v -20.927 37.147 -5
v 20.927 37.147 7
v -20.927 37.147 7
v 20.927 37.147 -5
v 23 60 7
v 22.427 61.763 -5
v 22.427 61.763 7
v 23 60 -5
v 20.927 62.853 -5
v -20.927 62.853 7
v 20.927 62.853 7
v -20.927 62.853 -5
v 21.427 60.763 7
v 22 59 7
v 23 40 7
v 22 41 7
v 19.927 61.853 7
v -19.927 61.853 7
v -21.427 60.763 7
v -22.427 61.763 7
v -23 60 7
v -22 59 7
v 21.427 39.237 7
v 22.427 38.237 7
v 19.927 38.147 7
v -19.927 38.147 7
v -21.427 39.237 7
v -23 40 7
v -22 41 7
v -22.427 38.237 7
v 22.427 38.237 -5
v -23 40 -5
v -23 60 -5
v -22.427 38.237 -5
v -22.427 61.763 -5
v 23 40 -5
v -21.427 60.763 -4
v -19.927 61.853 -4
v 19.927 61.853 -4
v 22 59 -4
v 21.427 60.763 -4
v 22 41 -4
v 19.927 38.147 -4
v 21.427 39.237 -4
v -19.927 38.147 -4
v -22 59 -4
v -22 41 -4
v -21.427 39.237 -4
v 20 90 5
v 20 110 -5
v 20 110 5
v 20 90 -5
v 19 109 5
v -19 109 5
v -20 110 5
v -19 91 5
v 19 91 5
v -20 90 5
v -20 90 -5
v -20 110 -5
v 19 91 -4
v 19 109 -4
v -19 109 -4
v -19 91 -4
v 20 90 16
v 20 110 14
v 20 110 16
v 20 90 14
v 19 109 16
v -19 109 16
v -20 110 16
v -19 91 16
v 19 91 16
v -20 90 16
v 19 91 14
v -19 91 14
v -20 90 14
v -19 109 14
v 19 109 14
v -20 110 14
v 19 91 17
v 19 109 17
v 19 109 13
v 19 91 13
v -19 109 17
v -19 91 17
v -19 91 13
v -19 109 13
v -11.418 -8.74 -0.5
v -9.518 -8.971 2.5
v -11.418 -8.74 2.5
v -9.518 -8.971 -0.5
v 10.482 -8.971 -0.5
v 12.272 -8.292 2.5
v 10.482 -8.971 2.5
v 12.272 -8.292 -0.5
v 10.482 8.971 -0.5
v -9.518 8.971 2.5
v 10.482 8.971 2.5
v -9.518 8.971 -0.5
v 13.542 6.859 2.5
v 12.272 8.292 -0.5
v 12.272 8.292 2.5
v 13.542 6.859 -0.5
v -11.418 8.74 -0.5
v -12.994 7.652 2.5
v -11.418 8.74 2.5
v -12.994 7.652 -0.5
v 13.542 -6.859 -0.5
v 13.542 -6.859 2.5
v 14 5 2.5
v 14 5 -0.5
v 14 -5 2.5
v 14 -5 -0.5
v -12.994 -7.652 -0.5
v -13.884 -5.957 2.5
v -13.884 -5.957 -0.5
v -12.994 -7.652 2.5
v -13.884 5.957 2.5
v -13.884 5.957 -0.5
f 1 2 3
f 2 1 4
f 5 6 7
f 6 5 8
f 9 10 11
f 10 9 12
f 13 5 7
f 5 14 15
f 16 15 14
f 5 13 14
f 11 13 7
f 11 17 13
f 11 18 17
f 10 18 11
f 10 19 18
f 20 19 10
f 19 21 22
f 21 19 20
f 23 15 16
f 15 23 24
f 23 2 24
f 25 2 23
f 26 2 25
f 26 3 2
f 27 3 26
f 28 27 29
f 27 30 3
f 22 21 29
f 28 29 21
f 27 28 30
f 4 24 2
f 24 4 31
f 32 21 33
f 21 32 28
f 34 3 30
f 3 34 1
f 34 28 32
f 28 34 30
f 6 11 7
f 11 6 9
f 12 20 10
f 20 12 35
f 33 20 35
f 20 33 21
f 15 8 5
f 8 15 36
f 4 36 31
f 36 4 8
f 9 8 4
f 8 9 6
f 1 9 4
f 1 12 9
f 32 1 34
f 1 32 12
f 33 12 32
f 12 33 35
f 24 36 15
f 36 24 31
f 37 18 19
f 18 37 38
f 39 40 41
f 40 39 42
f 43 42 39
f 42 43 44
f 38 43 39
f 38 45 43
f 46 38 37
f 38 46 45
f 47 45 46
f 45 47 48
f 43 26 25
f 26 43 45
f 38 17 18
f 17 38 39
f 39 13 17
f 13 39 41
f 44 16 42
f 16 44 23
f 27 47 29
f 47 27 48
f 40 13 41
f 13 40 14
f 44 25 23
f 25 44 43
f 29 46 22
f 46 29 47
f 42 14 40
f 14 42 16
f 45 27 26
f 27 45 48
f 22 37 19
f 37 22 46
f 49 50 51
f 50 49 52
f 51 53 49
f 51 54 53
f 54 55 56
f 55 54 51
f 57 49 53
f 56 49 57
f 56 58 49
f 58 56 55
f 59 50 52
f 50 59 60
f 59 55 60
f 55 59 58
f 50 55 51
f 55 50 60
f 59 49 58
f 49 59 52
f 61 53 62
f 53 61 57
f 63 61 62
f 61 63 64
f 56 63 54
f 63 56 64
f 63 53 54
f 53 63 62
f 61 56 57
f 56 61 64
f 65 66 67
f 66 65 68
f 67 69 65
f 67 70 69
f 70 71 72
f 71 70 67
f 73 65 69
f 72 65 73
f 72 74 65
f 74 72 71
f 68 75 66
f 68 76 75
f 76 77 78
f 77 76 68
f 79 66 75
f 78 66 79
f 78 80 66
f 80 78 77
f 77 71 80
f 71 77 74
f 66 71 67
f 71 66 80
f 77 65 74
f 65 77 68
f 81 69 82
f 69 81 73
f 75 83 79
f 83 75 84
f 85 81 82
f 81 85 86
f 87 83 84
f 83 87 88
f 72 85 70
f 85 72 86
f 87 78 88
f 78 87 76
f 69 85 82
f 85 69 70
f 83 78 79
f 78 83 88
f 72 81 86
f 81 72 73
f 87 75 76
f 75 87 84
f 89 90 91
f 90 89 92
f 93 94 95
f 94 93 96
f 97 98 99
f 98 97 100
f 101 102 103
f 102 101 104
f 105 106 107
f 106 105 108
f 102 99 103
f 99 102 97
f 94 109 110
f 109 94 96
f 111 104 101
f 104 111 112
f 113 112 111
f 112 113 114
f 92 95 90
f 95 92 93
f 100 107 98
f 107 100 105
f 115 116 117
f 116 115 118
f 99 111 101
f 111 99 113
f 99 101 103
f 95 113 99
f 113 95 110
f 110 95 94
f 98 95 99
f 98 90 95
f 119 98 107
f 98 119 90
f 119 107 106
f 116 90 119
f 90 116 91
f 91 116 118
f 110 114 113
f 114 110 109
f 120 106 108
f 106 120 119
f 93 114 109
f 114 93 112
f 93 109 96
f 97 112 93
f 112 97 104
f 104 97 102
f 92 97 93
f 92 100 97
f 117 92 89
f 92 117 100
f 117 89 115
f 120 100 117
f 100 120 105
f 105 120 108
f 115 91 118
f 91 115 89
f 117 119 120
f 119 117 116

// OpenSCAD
// Other ways to build parts
/*

Sage Ridge Robotics OpenSCAD file.
Christopher von Nagy, July 2014.

Example 07 Constructing objects. 

*/


// OpenSCAD has a few tricks for constructing objects
// that inolve the clever combination of geometric
// primitives, cubes, spheres, etc.

// The minkowski() command is one such tool. We are 
// going to use it to create a small box with rounded corners.

// First the basic shape is generated. You can change the size
// of the cylinders to alter the rounding of the corner.

translate([0,0,0])
minkowski()
{
   cube([20,10,1], center=true);
   cylinder(r=4,h=2);
};

// Great. Let's build the box by defining the outer box
// as a minkowski() object then subtracting a slightly
// smaller box to leave 1mm walls.

translate([0,50,0])
difference(){
   minkowski()
   {
      cube([40,20,10], center=true);
      cylinder(r=3,h=2);
   }
   translate([0,0,1])
   minkowski()
   {
      cube([38,18,10], center=true);
      cylinder(r=3,h=2);
   }
};


// Building a box and top is even easier if you do
// not want rounded corners.

translate([0,100,0])
difference(){
   cube([40,20,10], center=true);
   translate([0,0,1]) cube([38,18,10], center=true);
}

translate([0,100,15]) 
union(){
   cube([40,20,2], center=true);
   translate(0,0,0) cube([38,18,4], center=true);
}

/*

License code:

Creative Commons Atribution 4.0

Attribution — You must give appropriate credit, provide a link to the license, and indicate if changes were made. You may do so in any reasonable manner, but not in any way that suggests the licensor endorses you or your use.

No additional restrictions — You may not apply legal terms or technological measures that legally restrict others from doing anything the license permits.


*/
